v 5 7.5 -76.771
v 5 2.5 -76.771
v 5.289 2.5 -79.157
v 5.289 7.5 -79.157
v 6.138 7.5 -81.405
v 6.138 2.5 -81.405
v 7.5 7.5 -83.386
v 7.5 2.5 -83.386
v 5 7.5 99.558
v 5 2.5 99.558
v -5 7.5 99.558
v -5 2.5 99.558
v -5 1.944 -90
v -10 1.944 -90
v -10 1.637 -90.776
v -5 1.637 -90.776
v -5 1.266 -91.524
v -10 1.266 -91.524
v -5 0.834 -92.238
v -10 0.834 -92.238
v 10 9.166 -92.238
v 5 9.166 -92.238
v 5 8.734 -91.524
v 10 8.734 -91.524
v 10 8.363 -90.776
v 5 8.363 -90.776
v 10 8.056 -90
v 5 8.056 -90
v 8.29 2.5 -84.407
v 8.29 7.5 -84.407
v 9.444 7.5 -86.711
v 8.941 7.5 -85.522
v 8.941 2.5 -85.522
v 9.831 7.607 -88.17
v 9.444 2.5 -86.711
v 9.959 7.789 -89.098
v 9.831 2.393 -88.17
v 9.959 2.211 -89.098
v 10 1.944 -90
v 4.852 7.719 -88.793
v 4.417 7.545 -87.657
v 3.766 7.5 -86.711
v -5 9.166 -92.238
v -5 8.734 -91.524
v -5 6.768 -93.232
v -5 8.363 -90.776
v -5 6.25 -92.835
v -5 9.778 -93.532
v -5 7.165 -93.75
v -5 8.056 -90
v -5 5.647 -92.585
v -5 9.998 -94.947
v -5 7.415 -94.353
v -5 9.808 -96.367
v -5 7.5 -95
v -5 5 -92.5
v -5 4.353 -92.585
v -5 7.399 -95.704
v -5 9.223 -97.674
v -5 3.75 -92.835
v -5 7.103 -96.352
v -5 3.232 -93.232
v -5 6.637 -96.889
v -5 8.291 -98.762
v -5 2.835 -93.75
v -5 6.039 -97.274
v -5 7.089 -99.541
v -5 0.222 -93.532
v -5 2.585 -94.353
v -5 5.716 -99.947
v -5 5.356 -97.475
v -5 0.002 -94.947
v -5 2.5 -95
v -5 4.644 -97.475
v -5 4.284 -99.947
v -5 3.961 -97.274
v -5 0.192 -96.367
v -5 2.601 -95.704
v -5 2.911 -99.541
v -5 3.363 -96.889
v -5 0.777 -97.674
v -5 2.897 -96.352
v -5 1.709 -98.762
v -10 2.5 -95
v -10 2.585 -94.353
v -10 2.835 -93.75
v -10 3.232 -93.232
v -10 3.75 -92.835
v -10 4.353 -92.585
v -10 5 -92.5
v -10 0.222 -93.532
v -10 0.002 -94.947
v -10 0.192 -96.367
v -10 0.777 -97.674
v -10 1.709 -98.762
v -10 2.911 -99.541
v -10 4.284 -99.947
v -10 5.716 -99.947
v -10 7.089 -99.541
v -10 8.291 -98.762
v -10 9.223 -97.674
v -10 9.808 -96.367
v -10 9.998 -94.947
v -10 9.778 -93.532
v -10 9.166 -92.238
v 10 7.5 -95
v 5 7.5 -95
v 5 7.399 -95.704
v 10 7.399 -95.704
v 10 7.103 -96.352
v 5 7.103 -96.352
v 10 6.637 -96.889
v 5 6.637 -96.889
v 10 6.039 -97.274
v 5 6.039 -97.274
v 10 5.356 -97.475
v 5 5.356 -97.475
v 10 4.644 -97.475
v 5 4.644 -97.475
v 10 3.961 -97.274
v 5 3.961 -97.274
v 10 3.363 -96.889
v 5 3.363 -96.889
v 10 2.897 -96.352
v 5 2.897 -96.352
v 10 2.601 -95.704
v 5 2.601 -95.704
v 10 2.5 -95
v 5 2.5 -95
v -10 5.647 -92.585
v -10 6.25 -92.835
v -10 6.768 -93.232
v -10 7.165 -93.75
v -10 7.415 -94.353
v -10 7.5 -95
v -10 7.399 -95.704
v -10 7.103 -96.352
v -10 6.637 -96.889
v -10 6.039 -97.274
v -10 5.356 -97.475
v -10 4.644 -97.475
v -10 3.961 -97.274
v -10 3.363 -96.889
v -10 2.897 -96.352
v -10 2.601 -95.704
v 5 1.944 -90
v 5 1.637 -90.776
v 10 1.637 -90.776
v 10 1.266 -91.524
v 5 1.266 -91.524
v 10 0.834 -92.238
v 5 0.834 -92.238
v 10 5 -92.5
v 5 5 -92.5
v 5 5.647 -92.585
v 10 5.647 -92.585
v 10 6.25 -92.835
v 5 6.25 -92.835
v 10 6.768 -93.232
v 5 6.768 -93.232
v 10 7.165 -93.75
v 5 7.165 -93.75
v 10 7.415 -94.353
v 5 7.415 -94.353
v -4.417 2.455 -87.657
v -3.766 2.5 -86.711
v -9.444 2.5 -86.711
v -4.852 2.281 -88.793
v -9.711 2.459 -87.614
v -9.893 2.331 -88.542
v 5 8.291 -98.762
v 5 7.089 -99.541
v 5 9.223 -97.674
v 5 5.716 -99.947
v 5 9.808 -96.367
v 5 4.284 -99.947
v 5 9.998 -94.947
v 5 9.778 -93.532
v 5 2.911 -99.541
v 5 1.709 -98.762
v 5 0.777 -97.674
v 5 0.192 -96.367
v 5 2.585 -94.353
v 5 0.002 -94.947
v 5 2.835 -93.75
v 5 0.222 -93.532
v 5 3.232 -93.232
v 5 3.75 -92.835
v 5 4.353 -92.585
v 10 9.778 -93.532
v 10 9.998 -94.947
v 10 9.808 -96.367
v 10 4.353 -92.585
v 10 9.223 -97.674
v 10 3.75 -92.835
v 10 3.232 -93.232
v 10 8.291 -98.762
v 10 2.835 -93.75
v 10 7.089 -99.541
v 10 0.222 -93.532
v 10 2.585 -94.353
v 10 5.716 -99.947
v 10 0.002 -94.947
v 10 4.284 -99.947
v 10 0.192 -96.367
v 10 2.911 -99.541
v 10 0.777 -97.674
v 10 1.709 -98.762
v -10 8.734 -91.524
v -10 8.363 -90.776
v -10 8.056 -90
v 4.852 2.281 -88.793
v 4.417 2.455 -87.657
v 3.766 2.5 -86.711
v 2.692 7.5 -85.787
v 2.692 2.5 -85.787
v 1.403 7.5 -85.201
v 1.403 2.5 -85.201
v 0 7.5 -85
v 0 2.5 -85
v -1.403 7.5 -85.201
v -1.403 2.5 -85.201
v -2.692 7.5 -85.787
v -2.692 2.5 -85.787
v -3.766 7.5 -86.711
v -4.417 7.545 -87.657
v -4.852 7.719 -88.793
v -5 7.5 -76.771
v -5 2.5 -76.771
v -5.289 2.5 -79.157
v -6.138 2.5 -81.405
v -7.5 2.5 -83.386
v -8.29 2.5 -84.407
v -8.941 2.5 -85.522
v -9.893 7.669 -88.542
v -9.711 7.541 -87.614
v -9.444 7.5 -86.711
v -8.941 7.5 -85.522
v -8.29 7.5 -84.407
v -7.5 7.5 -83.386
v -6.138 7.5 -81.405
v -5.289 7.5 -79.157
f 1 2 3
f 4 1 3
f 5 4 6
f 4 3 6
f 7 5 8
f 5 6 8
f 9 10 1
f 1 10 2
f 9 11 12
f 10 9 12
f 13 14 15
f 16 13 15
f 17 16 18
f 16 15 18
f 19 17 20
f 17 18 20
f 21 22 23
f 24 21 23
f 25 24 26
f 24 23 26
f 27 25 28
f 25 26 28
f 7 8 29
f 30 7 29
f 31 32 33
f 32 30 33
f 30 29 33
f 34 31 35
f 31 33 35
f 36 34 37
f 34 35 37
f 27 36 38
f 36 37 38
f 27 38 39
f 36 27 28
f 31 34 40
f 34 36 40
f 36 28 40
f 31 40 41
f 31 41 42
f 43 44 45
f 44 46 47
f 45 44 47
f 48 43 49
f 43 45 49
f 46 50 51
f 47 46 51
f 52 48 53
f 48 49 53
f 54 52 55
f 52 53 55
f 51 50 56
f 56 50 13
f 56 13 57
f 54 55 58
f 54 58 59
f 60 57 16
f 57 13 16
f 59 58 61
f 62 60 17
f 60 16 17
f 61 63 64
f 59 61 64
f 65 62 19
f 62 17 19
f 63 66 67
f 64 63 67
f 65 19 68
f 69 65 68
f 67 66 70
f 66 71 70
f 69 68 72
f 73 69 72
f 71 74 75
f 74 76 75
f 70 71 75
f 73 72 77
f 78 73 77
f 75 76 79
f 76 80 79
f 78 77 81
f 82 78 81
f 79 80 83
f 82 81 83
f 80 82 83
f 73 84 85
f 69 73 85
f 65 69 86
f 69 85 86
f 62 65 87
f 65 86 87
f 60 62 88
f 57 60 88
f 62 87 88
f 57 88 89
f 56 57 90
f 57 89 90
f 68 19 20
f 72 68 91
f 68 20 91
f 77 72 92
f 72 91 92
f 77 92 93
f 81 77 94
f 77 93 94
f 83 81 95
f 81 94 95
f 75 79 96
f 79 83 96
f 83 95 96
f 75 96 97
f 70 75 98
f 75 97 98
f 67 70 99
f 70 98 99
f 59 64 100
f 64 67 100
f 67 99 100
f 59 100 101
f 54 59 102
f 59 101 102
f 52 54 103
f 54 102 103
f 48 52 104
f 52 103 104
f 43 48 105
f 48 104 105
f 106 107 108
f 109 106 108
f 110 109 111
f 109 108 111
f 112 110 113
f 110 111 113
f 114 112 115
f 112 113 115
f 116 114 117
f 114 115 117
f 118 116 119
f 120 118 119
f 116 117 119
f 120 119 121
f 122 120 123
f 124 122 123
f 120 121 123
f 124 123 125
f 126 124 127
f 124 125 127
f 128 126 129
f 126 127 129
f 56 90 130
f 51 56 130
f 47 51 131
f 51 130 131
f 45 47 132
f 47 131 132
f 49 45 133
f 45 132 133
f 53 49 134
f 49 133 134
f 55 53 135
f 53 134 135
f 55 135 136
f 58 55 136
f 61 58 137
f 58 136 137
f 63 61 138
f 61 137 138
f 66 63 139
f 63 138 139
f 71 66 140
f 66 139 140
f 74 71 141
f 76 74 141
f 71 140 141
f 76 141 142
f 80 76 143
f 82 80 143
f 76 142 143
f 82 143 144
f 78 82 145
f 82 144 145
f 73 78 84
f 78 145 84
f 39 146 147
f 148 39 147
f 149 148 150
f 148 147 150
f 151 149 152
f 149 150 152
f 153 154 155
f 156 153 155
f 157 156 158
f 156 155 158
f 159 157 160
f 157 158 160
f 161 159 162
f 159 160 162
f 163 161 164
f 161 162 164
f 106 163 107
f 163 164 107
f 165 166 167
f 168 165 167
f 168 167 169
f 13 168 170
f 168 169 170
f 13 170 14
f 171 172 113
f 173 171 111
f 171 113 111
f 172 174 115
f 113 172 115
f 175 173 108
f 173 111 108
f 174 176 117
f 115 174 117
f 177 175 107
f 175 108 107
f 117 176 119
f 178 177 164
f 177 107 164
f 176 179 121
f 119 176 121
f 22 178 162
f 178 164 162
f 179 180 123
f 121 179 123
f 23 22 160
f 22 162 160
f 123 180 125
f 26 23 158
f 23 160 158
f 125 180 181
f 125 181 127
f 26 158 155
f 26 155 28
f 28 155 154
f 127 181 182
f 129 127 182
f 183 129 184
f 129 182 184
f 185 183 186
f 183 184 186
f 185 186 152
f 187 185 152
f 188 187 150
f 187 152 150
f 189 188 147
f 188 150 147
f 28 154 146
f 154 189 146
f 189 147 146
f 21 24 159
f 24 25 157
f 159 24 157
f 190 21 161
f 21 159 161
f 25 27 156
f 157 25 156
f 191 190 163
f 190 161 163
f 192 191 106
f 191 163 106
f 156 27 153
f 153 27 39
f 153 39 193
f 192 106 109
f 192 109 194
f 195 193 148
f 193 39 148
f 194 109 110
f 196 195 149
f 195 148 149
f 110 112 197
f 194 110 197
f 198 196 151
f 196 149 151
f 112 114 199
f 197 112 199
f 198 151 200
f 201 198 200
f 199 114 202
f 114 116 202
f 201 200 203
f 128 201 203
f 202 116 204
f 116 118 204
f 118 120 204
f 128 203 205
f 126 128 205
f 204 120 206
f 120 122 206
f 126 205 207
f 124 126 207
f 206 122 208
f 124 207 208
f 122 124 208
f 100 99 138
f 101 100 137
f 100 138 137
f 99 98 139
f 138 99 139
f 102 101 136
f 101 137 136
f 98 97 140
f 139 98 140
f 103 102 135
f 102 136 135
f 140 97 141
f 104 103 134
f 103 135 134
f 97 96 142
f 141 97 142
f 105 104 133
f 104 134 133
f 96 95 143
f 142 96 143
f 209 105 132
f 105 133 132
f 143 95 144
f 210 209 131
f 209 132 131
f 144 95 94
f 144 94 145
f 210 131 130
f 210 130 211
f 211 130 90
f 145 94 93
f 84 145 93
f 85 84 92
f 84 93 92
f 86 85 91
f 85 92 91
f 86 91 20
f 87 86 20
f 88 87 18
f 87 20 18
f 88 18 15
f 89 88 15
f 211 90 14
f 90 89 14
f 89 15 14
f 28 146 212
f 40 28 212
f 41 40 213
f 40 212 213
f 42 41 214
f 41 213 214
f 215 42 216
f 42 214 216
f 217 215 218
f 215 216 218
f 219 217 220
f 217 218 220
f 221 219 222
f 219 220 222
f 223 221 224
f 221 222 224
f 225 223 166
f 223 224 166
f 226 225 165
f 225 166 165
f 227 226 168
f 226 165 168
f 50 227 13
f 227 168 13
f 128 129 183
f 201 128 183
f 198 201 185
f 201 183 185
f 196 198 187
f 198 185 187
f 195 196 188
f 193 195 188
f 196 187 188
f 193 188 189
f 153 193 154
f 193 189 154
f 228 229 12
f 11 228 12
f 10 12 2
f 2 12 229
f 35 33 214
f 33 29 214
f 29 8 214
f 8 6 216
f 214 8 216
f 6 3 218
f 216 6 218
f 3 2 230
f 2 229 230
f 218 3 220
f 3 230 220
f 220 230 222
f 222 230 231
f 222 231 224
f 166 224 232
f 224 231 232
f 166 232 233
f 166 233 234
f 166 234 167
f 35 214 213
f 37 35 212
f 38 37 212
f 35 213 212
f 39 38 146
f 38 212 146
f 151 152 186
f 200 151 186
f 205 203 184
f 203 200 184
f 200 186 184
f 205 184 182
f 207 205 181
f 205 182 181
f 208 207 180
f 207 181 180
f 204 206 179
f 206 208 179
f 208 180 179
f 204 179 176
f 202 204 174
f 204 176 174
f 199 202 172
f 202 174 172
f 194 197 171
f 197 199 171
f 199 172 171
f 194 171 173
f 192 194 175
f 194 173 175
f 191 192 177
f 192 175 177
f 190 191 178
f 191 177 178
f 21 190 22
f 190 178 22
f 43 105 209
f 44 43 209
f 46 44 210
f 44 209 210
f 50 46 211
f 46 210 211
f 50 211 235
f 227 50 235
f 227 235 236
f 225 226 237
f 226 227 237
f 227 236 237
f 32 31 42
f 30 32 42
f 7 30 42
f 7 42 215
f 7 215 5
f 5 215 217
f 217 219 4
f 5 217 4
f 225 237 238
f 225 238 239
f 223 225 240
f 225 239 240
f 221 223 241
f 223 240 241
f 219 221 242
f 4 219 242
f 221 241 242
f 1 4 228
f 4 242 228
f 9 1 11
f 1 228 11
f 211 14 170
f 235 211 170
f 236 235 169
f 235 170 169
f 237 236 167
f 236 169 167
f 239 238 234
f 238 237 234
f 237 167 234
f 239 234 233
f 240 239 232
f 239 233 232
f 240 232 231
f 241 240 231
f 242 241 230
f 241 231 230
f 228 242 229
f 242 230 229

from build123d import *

# Parameters (mm, degrees)
BOSS_EXTRUDE1_DEPTH = 10
CUT_EXTRUDE5_DEPTH  = 103.46950766


with BuildPart() as part:
    # Sketch1 → Boss-Extrude1 (new body)
    with BuildSketch(Plane(origin=(0, 0, 0), x_dir=(1, 0, 0), z_dir=(0, 1, 0))):
        with BuildLine():
            ThreePointArc((5, 90), (0, 85), (-5, 90))
            Line((-5, 90), (-5, 98.660254038))
            ThreePointArc((-5, 98.660254038), (-8.660254037, 95.000000002), (-10, 90.000000004))
            ThreePointArc((-10, 90.000000004), (-9.354143468, 86.464466096), (-7.5, 83.385621722))
            ThreePointArc((-7.5, 83.385621722), (-5.645856533, 80.306777351), (-5, 76.771243445))
            Line((-5, 76.771243445), (-5, -100))
            Line((-5, -100), (5, -100))
            Line((5, -100), (5, 76.771243445))
            ThreePointArc((5, 76.771243445), (5.645856533, 80.306777351), (7.5, 83.385621722))
            ThreePointArc((7.5, 83.385621722), (9.354143466, 86.464466092), (10, 89.999999995))
            ThreePointArc((10, 89.999999995), (8.660254039, 94.999999998), (5, 98.660254038))
            Line((5, 98.660254038), (5, 90))
        make_face()
        with BuildLine():
            Line((5, 100), (5, 98.660254038))
            ThreePointArc((5, 98.660254038), (8.660254039, 94.999999998), (10, 89.999999995))
            Line((10, 89.999999995), (10, 100))
            Line((10, 100), (5, 100))
        make_face()
        with BuildLine():
            ThreePointArc((-10, 90.000000004), (-8.660254037, 95.000000002), (-5, 98.660254038))
            Line((-5, 98.660254038), (-5, 100))
            Line((-5, 100), (-10, 100))
            Line((-10, 100), (-10, 90.000000004))
        make_face()
    extrude(amount=BOSS_EXTRUDE1_DEPTH)

    # Sketch2 → Cut-Extrude5 (cut, through all)
    with BuildSketch(Plane.ZY.offset(10)):
        with BuildLine():
            ThreePointArc((-92.237664695, 9.165798128), (-91.153608851, 8.540893309), (-90, 8.056259709))
            Line((-90, 8.056259709), (-90, 10))
            Line((-90, 10), (-100, 10))
            Line((-100, 10), (-100, 0))
            Line((-100, 0), (-90, 0))
            Line((-90, 0), (-90, 1.943740291))
            ThreePointArc((-90, 1.943740291), (-91.153608851, 1.459106691), (-92.237664695, 0.834201872))
            ThreePointArc((-92.237664695, 0.834201872), (-99.998436794, 5), (-92.237664695, 9.165798128))
        make_face()
        with BuildLine():
            ThreePointArc((-90, 8.056259709), (-88.378988868, 7.640045565), (-86.711266306, 7.5))
            Line((-86.711266306, 7.5), (99.557534865, 7.5))
            Line((99.557534865, 7.5), (99.557534865, 2.5))
            Line((99.557534865, 2.5), (-86.711266306, 2.5))
            ThreePointArc((-86.711266306, 2.5), (-88.378988868, 2.359954435), (-90, 1.943740291))
            Line((-90, 1.943740291), (-90, 0))
            Line((-90, 0), (-83.385621722, 0))
            Line((-83.385621722, 0), (-76.771243445, 0))
            Line((-76.771243445, 0), (100, 0))
            Line((100, 0), (100, 10))
            Line((100, 10), (-76.771243445, 10))
            Line((-76.771243445, 10), (-83.385621722, 10))
            Line((-83.385621722, 10), (-90, 10))
            Line((-90, 10), (-90, 8.056259709))
        make_face()
        with BuildLine():
            ThreePointArc((-92.5, 5), (-93.232233047, 6.767766953), (-95, 7.5))
            Line((-95, 7.5), (-95, 2.5))
            ThreePointArc((-95, 2.5), (-93.232233047, 3.232233047), (-92.5, 5))
        make_face()
        with BuildLine():
            Line((-95, 2.5), (-95, 7.5))
            ThreePointArc((-95, 7.5), (-97.5, 5), (-95, 2.5))
        make_face()
    extrude(amount=-CUT_EXTRUDE5_DEPTH, mode=Mode.SUBTRACT)


solid = part.part
